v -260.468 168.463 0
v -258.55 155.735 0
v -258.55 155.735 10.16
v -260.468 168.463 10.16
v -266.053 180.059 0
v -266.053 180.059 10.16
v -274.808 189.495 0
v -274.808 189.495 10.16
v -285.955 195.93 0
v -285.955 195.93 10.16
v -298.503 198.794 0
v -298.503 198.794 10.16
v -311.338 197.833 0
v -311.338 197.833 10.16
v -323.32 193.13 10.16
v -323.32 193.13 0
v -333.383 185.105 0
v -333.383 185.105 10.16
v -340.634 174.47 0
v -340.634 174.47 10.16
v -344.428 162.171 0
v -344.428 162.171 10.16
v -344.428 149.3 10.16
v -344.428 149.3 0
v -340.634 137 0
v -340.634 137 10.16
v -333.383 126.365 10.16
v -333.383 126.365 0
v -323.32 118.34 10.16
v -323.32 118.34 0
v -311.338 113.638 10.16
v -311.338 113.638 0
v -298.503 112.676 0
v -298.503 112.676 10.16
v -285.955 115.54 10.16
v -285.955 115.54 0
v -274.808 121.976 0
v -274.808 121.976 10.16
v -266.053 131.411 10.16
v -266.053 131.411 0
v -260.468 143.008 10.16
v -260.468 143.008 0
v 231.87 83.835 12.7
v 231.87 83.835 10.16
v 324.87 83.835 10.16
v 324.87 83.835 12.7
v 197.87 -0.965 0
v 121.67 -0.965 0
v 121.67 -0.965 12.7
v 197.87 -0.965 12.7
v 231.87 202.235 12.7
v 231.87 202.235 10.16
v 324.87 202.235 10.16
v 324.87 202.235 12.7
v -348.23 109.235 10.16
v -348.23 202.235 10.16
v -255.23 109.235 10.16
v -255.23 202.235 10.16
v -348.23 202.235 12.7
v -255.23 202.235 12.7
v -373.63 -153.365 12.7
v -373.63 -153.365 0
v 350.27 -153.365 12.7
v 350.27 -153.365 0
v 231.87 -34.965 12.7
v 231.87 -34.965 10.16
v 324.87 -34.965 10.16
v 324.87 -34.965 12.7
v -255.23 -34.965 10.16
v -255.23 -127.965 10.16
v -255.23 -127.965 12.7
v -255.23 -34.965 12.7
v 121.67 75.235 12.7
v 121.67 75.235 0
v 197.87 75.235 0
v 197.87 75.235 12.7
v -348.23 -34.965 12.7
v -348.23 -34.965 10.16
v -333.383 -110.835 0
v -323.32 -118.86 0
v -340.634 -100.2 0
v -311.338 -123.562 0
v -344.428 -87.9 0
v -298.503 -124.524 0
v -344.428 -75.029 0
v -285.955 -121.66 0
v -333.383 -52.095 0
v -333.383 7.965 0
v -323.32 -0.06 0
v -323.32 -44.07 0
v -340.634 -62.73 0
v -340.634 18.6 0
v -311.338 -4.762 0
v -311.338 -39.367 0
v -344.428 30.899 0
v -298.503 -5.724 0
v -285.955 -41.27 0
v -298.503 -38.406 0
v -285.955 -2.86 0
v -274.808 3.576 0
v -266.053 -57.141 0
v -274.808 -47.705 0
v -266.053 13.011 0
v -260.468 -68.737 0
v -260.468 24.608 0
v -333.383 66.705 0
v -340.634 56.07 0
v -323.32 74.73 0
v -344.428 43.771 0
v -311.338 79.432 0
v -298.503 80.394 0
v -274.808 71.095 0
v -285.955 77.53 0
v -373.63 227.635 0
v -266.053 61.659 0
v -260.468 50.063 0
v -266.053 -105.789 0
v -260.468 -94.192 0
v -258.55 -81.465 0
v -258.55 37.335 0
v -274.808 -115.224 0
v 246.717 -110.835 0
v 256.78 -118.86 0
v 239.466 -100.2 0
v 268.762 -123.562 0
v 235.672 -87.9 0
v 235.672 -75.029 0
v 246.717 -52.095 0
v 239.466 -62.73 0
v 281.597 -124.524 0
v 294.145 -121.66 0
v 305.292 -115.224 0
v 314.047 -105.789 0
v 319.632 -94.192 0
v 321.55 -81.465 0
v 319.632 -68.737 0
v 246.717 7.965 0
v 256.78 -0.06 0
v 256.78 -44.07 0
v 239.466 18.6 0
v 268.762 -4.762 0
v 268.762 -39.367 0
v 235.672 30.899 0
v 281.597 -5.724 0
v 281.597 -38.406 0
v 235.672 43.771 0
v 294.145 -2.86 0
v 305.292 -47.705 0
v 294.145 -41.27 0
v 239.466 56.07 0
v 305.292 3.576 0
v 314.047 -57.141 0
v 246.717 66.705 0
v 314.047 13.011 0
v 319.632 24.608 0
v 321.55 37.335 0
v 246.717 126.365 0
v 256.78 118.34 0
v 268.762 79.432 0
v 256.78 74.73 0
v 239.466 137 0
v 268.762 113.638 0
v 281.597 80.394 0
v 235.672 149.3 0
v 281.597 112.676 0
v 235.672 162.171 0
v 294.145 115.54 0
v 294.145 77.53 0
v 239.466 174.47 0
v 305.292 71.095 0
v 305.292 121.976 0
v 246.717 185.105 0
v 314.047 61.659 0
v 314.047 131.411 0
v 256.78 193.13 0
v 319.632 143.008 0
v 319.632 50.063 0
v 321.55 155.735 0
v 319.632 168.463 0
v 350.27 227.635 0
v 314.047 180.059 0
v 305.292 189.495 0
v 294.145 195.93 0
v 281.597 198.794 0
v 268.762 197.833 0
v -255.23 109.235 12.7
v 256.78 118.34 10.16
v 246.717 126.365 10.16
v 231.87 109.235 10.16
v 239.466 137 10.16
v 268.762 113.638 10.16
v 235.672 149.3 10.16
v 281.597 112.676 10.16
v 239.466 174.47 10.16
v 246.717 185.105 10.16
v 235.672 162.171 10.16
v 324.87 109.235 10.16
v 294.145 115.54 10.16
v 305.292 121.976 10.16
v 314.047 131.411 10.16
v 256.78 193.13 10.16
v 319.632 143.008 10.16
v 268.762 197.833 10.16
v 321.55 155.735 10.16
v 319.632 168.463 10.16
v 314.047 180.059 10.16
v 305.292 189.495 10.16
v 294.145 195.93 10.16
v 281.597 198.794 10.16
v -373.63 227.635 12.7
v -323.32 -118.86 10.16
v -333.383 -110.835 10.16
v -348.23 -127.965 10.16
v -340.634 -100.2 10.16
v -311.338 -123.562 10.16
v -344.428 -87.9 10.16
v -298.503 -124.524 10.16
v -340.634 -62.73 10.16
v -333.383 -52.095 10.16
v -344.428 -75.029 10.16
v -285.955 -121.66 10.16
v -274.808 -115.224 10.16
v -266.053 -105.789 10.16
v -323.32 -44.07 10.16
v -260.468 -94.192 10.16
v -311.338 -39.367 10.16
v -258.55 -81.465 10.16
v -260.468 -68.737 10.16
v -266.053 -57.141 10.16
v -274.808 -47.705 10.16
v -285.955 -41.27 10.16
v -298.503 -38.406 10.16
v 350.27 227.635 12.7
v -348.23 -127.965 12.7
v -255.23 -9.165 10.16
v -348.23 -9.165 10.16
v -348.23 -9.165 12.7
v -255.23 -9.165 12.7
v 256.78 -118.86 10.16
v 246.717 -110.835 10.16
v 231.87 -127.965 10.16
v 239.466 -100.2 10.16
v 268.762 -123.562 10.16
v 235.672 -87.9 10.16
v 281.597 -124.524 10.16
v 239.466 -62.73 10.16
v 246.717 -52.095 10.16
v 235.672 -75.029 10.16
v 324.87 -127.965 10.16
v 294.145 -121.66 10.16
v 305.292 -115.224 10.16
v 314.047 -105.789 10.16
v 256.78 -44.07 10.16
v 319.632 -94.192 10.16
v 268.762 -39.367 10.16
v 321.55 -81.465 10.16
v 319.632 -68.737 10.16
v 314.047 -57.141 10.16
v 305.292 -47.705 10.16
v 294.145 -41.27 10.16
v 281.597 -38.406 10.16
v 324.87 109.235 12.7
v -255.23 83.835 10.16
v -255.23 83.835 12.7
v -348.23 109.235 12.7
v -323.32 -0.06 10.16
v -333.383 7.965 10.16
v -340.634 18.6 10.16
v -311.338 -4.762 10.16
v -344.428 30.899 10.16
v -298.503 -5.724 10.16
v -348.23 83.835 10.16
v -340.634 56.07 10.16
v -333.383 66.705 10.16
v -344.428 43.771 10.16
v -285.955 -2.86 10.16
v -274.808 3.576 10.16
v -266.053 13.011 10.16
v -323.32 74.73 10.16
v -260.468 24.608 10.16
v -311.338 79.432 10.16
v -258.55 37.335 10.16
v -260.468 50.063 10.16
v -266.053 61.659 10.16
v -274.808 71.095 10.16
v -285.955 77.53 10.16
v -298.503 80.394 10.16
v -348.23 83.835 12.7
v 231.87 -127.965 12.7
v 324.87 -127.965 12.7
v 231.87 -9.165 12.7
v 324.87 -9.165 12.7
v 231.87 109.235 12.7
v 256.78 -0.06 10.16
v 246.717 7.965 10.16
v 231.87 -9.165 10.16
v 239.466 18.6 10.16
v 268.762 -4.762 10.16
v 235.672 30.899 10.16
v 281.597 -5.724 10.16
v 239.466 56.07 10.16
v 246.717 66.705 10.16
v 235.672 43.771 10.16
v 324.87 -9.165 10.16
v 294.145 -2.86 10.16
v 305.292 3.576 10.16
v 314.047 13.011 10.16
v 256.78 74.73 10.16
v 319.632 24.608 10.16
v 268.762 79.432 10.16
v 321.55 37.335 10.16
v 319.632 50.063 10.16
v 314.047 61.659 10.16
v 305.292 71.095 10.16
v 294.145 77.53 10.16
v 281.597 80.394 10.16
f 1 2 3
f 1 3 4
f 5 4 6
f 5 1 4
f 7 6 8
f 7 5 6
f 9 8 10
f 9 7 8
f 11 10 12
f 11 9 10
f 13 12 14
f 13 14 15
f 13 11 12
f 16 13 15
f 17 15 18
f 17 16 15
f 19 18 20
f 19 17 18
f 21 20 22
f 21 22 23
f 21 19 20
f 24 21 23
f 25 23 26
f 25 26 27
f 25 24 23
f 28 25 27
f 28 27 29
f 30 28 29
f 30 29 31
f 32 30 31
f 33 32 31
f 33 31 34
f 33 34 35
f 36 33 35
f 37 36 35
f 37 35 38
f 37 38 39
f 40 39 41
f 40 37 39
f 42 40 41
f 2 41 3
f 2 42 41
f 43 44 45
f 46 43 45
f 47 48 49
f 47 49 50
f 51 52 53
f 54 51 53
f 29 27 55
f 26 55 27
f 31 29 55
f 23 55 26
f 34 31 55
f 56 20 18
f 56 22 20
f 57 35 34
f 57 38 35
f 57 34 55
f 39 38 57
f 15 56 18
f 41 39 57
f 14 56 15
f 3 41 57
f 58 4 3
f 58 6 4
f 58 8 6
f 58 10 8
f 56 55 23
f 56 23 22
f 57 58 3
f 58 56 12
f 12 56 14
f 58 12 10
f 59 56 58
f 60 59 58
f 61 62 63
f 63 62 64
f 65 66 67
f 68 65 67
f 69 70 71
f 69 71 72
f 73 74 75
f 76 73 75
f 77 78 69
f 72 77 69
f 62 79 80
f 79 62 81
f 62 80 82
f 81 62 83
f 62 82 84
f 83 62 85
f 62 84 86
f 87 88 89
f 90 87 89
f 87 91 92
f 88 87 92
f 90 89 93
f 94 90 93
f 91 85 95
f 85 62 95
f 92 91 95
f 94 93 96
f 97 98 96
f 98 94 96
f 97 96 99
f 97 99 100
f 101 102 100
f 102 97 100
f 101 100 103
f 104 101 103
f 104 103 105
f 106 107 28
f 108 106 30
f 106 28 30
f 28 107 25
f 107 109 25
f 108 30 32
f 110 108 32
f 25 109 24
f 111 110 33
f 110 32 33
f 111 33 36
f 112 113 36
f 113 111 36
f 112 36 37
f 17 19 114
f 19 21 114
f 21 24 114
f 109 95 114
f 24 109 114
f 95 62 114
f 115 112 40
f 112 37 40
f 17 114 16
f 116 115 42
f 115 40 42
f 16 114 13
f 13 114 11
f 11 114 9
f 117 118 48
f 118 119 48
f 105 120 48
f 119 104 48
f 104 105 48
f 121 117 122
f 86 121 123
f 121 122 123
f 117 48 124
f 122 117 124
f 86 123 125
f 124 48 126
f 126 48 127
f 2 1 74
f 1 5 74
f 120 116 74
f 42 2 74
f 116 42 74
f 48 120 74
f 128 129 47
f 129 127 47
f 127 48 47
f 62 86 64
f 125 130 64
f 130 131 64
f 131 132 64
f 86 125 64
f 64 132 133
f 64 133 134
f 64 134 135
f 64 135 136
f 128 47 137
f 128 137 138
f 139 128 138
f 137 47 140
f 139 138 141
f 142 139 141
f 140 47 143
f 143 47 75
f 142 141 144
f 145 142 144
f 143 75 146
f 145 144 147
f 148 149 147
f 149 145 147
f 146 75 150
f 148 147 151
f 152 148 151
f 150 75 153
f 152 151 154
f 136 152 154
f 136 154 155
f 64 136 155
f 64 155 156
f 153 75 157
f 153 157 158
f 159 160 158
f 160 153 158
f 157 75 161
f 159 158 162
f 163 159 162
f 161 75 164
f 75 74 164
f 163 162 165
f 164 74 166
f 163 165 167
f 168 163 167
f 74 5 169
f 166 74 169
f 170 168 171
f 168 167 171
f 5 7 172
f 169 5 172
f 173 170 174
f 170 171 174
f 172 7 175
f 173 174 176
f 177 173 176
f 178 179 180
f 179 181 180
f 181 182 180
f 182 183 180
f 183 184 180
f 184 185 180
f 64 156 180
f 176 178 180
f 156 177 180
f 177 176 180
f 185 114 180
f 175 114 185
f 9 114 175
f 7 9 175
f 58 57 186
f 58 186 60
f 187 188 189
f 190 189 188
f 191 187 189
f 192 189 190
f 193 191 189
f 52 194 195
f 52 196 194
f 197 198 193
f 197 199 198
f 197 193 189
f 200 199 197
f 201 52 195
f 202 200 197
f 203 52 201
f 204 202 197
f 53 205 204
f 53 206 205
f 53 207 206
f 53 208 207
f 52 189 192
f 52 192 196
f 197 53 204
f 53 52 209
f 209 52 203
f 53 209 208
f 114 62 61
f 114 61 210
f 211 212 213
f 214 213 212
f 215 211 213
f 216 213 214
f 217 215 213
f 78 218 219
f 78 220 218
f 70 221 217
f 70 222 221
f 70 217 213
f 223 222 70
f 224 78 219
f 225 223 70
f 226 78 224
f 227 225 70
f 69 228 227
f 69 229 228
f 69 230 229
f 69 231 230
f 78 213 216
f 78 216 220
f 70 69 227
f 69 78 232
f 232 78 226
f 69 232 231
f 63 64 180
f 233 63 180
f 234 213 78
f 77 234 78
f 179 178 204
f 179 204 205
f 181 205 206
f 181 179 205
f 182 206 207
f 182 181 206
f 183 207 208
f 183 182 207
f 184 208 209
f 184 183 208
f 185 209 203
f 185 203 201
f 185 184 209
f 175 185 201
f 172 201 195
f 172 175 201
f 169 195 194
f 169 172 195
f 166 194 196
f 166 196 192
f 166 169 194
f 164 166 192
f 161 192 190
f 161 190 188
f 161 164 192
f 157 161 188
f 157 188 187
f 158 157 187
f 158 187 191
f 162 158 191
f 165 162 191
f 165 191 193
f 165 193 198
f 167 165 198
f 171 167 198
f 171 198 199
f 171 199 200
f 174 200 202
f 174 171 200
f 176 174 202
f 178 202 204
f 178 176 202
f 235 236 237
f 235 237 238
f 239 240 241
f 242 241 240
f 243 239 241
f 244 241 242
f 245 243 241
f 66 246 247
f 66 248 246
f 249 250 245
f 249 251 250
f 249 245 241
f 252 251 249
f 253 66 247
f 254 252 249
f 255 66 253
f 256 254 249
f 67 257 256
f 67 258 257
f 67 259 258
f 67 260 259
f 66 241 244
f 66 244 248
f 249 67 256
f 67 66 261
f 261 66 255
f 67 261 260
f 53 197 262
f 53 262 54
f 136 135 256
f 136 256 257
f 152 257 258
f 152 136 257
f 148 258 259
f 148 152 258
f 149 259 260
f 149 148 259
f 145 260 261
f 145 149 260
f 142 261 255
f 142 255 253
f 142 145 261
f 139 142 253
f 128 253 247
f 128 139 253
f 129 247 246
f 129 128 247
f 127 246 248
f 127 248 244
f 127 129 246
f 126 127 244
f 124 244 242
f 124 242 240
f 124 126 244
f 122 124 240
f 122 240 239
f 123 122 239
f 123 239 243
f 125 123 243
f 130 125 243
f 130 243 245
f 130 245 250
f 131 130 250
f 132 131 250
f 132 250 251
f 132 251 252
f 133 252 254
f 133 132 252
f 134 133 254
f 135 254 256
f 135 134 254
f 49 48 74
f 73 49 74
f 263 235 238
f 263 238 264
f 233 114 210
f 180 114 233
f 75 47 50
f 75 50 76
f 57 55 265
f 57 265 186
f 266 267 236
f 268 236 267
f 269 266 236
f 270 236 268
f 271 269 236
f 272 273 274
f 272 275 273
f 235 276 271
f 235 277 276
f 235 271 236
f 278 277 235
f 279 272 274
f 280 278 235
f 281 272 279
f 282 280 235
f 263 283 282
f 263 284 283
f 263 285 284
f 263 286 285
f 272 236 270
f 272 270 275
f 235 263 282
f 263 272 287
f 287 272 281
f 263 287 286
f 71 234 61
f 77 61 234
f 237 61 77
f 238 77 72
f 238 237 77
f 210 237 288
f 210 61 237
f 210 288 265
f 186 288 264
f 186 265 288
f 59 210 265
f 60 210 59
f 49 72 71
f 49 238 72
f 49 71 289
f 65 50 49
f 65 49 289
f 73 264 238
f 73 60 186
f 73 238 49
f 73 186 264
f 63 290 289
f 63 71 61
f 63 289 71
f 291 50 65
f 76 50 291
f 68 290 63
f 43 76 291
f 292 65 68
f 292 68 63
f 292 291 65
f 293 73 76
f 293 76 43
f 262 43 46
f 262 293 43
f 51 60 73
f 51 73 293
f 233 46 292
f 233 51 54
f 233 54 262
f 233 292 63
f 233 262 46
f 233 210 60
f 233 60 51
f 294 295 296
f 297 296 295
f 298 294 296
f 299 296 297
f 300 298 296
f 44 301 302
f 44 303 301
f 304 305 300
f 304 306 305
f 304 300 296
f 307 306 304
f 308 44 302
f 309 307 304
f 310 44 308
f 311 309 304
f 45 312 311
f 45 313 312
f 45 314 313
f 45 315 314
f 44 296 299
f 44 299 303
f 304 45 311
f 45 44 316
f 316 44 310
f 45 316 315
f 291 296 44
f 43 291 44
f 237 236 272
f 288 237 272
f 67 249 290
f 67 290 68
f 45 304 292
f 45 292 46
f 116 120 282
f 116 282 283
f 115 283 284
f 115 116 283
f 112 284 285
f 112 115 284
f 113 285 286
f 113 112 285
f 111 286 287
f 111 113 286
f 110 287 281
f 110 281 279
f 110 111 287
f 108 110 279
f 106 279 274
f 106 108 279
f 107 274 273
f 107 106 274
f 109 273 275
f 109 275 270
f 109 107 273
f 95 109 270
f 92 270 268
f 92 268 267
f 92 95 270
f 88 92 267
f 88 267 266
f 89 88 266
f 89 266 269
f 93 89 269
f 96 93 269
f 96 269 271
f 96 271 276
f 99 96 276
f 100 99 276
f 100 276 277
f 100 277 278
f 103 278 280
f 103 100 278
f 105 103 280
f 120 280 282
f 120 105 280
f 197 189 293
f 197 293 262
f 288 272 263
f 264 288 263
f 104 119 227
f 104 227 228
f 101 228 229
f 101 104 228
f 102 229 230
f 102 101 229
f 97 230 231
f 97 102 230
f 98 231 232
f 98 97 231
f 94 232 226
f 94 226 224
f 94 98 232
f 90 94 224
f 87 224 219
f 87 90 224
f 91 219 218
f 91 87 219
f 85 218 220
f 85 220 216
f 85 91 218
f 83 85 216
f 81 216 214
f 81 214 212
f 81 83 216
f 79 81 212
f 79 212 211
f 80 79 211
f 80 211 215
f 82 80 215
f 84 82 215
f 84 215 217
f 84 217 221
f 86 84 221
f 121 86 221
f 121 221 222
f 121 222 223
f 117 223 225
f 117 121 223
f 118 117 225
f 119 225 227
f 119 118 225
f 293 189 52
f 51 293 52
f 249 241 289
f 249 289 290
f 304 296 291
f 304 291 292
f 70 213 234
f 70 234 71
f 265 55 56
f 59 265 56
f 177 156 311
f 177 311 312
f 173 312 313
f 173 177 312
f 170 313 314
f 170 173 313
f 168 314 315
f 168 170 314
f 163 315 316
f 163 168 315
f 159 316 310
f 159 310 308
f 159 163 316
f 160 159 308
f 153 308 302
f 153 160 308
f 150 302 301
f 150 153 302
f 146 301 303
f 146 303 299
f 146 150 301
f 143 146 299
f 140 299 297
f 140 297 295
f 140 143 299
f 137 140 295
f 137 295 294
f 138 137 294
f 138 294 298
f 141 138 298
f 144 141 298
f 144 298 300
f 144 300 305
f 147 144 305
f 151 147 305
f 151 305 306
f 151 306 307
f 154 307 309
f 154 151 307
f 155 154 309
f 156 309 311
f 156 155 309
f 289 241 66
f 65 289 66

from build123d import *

# Parameters (mm, degrees)
F0_W     = 723.9
F0_H     = 381
F0_W_2   = 93.000068
F0_H_2   = 93.000068
F0_W_3   = 76.2
F0_H_3   = 76.2
F1_DEPTH = 12.7
F0_R     = 43.18
F2_DEPTH = 10.16
F3_DEPTH = 25.4
F4_DEPTH = 10.16


with BuildPart() as f1:
    # F0 (on Top) → F1 (new body)
    with BuildSketch(Plane.XY):
        with Locations((-11.680007, 37.135195)):
            Rectangle(F0_W, F0_H)
        with Locations((-301.729973, -81.464771)):
            Rectangle(F0_W_2, F0_H_2, mode=Mode.SUBTRACT)
        with Locations((278.369959, -81.464771)):
            Rectangle(F0_W_2, F0_H_2, mode=Mode.SUBTRACT)
        with Locations((159.769993, 37.135195)):
            Rectangle(F0_W_3, F0_H_3, mode=Mode.SUBTRACT)
        with Locations((-301.729973, 37.335093)):
            Rectangle(F0_W_2, F0_H_2, mode=Mode.SUBTRACT)
        with Locations((-301.729973, 155.735161)):
            Rectangle(F0_W_2, F0_H_2, mode=Mode.SUBTRACT)
        with Locations((278.369959, 37.335093)):
            Rectangle(F0_W_2, F0_H_2, mode=Mode.SUBTRACT)
        with Locations((278.369959, 155.735161)):
            Rectangle(F0_W_2, F0_H_2, mode=Mode.SUBTRACT)
    extrude(amount=F1_DEPTH)

    # F0 (on Top) → F2 (join)
    with BuildSketch(Plane.XY):
        with Locations((278.369959, 155.735161)):
            Rectangle(F0_W_2, F0_H_2)
        with Locations((278.369959, 155.735161)):
            Circle(F0_R, mode=Mode.SUBTRACT)
        with Locations((278.369959, 37.335093)):
            Rectangle(F0_W_2, F0_H_2)
        with Locations((278.369959, 37.335093)):
            Circle(F0_R, mode=Mode.SUBTRACT)
        with Locations((278.369959, -81.464771)):
            Rectangle(F0_W_2, F0_H_2)
        with Locations((278.369959, -81.464771)):
            Circle(F0_R, mode=Mode.SUBTRACT)
    extrude(amount=F2_DEPTH)

    # F0 (on Top) → F3 (cut)
    with BuildSketch(Plane.XY):
        with Locations((278.369959, 155.735161)):
            Circle(F0_R)
        with Locations((278.369959, 37.335093)):
            Circle(F0_R)
        with Locations((278.369959, -81.464771)):
            Circle(F0_R)
    extrude(amount=F3_DEPTH, mode=Mode.SUBTRACT)

    # F0 (on Top) → F4 (join)
    with BuildSketch(Plane.XY):
        with Locations((-301.729973, 155.735161)):
            Rectangle(F0_W_2, F0_H_2)
        with Locations((-301.729973, 155.735161)):
            Circle(F0_R, mode=Mode.SUBTRACT)
        with Locations((-301.729973, 37.335093)):
            Rectangle(F0_W_2, F0_H_2)
        with Locations((-301.729973, 37.335093)):
            Circle(F0_R, mode=Mode.SUBTRACT)
        with Locations((-301.729973, -81.464771)):
            Rectangle(F0_W_2, F0_H_2)
        with Locations((-301.729973, -81.464771)):
            Circle(F0_R, mode=Mode.SUBTRACT)
    extrude(amount=F4_DEPTH)


solid = f1.part
